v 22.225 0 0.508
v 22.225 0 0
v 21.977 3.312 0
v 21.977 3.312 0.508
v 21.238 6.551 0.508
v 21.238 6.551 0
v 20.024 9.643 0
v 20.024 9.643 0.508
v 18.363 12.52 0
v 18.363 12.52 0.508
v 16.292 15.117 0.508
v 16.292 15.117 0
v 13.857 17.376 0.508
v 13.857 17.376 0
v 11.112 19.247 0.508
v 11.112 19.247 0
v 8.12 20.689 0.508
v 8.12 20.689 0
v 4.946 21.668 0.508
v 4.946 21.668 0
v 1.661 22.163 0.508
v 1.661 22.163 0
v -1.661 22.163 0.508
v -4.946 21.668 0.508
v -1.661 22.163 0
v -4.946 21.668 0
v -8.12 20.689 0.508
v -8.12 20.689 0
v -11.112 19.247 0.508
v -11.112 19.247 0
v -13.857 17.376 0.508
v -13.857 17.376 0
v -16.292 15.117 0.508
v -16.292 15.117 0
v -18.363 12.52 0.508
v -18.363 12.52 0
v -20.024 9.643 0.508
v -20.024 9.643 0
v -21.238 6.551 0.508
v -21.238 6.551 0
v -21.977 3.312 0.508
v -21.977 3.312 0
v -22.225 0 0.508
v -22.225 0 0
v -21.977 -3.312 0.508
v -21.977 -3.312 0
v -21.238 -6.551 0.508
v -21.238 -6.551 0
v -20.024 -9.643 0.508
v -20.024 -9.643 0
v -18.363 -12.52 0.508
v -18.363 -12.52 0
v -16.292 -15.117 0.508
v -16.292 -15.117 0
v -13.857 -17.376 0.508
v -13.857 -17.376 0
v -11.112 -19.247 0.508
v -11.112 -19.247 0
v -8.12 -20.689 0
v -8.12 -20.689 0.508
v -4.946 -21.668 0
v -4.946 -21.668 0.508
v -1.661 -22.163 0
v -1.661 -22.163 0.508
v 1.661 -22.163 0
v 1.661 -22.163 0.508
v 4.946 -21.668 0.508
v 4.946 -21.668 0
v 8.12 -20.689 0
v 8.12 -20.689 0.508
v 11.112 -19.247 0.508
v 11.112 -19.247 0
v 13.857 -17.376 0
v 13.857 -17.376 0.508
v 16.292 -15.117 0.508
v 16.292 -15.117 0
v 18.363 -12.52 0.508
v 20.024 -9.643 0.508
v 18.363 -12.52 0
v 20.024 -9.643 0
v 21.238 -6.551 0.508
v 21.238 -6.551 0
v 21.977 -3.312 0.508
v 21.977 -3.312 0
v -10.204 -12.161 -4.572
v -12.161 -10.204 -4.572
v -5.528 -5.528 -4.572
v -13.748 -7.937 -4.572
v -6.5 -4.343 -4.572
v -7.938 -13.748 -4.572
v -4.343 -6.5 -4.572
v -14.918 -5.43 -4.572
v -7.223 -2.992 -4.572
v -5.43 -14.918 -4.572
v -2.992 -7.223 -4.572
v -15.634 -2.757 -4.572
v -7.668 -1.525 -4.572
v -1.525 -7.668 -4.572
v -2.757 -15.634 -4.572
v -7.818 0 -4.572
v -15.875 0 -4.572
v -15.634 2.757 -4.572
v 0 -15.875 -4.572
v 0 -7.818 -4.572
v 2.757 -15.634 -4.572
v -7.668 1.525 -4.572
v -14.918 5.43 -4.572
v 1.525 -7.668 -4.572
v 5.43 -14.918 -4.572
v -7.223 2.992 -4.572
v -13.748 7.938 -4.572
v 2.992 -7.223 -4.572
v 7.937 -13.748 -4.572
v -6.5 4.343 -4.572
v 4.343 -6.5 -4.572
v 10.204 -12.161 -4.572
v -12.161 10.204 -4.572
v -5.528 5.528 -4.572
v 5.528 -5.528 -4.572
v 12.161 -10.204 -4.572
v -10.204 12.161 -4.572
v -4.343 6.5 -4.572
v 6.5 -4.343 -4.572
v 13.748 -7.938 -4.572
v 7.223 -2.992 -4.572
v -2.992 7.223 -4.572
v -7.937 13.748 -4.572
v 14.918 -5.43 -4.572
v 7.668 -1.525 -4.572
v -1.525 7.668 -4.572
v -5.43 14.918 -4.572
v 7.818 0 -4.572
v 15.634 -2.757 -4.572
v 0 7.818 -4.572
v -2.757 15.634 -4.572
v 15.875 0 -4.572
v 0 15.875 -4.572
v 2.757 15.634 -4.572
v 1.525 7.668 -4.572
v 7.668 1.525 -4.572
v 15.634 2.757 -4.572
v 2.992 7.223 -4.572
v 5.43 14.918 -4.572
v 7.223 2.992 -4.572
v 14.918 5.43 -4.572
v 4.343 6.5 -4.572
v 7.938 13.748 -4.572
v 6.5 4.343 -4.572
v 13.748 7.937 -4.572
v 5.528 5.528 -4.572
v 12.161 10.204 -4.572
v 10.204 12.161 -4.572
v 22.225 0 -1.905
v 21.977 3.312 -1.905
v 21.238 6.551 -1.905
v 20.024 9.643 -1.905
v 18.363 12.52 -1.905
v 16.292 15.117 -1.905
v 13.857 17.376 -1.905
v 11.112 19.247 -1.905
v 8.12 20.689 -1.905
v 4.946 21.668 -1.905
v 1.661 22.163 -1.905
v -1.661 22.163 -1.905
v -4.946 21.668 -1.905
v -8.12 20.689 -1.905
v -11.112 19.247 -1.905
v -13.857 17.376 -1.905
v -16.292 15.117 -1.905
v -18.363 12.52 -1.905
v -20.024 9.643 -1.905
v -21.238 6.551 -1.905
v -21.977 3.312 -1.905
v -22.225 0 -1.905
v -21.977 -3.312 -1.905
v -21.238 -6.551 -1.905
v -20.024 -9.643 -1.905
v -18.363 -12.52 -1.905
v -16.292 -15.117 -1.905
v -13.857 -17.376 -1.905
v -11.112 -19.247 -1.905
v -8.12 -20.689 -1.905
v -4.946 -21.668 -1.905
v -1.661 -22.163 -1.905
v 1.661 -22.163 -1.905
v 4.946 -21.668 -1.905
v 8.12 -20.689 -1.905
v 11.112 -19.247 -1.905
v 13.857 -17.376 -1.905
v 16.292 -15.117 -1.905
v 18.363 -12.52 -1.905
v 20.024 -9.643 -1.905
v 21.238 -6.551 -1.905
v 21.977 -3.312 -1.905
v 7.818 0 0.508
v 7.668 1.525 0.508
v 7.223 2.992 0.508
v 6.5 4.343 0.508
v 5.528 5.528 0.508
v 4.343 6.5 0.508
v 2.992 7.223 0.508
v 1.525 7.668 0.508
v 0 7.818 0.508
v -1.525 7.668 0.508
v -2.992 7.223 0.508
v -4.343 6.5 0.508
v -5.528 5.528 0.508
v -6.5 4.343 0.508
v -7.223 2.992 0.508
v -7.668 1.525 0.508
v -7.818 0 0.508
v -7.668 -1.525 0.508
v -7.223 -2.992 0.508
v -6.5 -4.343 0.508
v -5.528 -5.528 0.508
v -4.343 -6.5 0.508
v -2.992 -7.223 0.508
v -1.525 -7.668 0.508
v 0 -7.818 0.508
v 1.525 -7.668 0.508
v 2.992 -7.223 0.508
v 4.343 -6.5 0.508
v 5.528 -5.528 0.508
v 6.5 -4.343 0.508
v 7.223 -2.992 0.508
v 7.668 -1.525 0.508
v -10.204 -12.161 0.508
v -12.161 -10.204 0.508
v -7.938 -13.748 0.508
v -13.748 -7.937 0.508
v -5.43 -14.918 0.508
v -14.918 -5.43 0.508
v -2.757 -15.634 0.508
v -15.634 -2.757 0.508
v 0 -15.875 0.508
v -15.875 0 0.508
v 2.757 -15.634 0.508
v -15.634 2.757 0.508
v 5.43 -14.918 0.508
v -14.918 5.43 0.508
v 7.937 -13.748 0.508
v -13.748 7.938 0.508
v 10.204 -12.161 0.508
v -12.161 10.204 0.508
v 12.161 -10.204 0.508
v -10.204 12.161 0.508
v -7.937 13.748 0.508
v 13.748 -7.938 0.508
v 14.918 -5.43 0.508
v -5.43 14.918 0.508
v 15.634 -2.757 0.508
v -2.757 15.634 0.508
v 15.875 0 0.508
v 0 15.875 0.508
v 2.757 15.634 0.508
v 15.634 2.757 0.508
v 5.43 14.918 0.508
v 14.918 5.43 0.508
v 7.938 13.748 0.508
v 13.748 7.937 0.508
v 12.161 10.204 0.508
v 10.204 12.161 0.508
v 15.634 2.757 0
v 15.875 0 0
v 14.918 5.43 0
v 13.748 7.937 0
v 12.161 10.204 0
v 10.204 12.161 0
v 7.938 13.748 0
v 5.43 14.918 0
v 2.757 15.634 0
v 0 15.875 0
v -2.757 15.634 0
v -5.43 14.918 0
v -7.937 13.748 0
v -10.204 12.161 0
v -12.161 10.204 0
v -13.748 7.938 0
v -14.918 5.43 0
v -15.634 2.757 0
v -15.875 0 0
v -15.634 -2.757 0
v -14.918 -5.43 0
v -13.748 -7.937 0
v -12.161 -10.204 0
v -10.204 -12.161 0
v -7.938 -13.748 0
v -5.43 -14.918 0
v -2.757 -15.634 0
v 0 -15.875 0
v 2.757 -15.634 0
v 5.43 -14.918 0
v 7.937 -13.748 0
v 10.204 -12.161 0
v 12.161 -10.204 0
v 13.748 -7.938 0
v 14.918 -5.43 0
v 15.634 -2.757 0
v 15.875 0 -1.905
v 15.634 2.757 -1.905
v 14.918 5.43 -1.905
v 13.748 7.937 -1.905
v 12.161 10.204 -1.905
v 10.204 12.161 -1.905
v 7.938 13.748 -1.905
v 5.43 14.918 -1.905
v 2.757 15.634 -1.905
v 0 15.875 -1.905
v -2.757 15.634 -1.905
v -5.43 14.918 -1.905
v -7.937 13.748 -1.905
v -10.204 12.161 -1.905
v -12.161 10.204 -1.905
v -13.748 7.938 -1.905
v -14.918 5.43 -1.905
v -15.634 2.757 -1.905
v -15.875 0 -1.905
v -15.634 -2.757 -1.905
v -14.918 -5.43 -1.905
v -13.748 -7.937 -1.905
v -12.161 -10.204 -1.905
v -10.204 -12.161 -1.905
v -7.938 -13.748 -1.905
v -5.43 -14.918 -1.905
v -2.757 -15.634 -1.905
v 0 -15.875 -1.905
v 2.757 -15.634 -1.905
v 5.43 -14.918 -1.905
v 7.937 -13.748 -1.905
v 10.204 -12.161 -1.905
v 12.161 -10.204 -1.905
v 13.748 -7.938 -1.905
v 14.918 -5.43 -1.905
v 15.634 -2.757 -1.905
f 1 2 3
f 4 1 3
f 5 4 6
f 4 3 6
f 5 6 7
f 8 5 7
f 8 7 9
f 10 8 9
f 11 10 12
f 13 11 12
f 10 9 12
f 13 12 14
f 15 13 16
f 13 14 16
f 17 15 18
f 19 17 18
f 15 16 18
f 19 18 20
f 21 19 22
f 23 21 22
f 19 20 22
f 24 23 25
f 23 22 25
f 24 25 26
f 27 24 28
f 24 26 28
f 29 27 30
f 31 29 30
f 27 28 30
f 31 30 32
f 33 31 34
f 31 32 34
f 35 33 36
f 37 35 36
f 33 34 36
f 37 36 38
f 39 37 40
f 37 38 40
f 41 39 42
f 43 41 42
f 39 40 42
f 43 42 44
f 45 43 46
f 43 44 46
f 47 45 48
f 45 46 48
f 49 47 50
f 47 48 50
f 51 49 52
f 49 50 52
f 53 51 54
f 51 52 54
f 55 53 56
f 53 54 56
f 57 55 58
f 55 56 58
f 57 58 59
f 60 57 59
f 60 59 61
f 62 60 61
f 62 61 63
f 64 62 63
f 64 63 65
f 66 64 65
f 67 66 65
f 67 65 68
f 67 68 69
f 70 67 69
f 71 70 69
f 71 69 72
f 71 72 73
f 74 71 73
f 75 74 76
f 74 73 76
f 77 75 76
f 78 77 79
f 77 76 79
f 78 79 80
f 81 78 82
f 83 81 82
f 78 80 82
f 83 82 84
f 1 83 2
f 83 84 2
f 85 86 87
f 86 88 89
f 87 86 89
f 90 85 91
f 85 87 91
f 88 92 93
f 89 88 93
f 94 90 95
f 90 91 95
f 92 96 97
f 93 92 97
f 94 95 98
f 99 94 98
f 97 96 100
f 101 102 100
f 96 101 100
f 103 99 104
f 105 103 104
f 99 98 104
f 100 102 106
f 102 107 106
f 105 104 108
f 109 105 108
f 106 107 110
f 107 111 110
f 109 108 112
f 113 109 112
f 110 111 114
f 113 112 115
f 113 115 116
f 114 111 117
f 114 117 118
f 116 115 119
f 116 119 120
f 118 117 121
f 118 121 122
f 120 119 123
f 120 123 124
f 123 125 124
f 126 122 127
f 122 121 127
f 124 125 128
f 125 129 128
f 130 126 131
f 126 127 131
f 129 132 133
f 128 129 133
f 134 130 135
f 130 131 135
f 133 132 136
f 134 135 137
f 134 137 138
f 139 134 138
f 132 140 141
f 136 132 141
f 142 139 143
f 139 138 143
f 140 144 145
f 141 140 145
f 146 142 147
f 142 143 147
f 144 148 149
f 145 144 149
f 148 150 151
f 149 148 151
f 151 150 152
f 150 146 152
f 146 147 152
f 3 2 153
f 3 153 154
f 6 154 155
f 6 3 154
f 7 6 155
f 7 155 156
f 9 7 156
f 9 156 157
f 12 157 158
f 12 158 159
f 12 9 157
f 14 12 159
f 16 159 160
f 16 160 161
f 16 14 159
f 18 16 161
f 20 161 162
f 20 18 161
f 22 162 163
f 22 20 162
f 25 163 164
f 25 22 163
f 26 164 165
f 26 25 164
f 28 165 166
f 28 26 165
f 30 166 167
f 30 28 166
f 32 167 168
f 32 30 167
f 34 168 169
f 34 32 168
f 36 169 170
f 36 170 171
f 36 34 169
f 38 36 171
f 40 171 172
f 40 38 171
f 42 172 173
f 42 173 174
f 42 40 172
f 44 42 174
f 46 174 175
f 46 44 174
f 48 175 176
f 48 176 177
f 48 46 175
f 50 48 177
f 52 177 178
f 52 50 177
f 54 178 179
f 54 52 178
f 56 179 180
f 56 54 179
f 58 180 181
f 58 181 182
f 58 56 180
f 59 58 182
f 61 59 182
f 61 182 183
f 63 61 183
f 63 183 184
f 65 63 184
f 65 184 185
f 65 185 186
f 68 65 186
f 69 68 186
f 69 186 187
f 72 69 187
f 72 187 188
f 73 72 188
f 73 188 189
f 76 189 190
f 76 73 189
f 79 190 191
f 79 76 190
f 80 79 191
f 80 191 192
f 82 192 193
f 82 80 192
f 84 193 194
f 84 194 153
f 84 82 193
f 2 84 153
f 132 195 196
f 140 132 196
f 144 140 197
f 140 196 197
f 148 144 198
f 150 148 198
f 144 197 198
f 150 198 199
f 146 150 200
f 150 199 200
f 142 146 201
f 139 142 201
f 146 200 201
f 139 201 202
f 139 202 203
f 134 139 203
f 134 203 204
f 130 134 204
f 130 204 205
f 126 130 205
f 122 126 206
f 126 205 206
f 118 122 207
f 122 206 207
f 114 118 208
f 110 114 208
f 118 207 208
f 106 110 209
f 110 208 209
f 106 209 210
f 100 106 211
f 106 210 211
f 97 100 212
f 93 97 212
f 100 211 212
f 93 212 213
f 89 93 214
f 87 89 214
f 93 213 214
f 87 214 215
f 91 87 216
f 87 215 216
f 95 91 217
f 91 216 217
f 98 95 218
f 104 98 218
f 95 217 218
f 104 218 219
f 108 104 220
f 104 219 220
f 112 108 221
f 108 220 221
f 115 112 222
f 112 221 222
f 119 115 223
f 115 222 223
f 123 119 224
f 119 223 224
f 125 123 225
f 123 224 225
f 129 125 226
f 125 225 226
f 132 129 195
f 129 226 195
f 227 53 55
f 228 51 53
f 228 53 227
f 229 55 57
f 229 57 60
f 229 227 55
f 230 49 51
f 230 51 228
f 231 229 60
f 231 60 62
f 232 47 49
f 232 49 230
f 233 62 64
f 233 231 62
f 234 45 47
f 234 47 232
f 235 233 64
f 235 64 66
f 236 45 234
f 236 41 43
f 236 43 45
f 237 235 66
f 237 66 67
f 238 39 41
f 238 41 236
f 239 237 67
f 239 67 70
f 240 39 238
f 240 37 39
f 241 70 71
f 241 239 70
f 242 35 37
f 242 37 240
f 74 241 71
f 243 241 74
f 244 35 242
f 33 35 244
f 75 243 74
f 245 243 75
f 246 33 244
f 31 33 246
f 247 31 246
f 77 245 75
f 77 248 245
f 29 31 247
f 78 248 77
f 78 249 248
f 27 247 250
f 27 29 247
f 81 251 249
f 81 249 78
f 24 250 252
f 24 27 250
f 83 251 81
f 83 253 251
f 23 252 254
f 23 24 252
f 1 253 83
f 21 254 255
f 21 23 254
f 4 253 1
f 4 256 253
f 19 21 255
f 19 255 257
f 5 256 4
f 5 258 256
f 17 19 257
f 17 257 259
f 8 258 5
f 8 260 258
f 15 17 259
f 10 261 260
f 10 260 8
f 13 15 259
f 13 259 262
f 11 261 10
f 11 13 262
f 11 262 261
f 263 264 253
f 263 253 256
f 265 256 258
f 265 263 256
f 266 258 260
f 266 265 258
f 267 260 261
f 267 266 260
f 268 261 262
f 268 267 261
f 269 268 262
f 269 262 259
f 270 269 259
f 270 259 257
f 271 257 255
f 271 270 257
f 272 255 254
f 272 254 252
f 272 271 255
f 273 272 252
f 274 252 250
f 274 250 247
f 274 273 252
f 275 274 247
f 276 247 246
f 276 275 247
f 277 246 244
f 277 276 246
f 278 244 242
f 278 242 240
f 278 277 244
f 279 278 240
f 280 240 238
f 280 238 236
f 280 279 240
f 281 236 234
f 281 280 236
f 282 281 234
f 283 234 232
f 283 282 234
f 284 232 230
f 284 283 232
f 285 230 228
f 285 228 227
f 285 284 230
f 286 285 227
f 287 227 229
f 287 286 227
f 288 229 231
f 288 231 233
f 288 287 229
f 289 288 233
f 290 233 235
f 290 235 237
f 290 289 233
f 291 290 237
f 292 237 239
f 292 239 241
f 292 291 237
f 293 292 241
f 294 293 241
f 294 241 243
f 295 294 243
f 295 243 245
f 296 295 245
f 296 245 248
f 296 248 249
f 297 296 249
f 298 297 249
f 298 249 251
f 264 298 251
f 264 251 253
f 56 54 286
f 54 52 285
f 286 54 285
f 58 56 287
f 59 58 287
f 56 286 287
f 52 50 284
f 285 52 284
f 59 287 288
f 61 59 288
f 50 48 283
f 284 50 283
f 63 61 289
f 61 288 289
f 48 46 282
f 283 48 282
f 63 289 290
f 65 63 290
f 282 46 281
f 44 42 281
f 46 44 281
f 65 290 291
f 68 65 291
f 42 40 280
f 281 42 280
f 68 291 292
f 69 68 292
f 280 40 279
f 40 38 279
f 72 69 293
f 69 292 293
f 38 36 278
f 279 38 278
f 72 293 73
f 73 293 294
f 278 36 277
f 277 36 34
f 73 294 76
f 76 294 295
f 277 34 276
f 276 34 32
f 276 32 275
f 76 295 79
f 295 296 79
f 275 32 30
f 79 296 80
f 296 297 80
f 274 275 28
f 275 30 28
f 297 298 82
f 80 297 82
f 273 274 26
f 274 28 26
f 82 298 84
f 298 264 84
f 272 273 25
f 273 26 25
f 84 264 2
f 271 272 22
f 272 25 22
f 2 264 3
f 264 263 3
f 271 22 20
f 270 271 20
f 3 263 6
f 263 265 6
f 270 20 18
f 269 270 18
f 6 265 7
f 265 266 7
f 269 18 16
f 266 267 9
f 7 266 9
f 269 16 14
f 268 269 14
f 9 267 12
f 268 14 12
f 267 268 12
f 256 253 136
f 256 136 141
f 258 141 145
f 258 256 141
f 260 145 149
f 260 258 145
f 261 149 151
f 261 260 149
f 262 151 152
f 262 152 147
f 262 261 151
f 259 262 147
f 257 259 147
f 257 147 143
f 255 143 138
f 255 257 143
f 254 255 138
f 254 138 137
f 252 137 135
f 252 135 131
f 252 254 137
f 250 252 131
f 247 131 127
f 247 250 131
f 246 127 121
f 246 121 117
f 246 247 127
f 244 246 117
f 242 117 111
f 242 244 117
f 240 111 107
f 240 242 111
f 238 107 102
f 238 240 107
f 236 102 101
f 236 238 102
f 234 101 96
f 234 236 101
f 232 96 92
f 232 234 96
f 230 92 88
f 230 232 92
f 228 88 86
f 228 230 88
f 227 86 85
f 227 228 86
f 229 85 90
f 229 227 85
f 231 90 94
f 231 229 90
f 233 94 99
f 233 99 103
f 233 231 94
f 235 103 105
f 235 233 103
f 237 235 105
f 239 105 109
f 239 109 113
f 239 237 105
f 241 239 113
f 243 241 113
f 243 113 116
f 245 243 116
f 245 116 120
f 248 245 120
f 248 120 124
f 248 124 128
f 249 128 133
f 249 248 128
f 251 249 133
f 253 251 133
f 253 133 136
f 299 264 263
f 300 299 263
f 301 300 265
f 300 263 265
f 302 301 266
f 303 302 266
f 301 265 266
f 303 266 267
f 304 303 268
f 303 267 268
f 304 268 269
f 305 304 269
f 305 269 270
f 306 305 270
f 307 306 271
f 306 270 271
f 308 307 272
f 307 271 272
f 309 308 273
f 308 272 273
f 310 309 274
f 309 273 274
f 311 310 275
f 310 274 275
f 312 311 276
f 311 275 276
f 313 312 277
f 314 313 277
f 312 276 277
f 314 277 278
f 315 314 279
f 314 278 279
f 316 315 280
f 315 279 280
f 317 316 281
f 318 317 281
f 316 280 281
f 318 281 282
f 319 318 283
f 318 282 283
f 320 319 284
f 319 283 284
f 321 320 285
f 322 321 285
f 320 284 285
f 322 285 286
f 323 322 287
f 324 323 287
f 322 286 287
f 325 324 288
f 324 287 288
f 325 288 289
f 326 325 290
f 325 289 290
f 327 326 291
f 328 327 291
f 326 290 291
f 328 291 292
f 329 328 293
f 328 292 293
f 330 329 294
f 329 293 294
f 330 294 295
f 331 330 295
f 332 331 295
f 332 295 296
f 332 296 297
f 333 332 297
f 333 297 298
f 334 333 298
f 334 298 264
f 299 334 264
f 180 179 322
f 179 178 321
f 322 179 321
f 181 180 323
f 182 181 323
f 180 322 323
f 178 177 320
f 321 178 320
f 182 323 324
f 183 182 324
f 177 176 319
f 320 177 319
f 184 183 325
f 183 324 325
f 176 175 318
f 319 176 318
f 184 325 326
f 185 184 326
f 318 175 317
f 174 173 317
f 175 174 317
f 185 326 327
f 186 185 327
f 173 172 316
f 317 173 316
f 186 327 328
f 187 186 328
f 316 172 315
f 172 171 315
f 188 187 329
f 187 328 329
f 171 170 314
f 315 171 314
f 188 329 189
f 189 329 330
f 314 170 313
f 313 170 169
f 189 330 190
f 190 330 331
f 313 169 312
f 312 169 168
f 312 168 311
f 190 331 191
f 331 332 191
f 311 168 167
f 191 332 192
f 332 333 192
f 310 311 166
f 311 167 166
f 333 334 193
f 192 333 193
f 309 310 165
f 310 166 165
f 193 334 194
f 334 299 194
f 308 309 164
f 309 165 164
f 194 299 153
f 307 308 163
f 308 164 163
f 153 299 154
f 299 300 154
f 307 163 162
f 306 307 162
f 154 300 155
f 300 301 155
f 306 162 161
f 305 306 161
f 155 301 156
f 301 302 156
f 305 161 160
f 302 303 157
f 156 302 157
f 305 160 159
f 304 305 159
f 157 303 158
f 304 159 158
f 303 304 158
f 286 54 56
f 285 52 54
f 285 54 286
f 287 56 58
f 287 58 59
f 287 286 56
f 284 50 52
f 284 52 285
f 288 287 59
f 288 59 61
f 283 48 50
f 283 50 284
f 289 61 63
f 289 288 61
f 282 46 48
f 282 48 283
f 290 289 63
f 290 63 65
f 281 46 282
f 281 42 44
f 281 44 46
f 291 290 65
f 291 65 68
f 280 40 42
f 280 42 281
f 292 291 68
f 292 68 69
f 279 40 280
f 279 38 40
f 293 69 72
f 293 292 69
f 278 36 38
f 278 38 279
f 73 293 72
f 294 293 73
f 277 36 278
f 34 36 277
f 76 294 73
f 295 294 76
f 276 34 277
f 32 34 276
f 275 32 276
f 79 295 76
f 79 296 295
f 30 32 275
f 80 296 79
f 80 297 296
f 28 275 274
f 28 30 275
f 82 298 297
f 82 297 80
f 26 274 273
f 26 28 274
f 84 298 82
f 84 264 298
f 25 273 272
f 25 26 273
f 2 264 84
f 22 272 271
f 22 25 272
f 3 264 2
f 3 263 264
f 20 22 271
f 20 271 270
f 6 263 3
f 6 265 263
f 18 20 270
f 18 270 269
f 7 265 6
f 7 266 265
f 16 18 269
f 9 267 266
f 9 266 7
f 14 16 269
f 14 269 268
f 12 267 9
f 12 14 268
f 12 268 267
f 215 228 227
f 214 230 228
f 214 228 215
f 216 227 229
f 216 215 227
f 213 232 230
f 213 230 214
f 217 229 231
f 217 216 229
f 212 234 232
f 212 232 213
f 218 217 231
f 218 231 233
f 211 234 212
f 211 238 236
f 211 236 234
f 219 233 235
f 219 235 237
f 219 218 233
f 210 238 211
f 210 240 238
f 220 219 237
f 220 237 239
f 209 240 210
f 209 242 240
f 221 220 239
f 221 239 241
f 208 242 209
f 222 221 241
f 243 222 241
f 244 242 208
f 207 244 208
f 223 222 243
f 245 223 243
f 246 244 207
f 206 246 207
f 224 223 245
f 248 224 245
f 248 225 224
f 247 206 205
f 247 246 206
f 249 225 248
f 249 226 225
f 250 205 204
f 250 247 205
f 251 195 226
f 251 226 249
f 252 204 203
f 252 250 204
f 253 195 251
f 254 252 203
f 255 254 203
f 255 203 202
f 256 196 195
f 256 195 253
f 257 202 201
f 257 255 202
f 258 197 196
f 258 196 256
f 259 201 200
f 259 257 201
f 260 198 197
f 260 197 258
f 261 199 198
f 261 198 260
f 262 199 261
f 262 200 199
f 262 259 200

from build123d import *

# Parameters (mm, degrees)
F0_R        = 22.225
F0_R_2      = 15.875
F1_DEPTH    = 1.905
F1_FACE_R   = 22.225
F1_FACE_R_2 = 15.875
F2_DEPTH    = 0.508
F3_R        = 15.875
F3_R_2      = 7.818053
F4_DEPTH    = 5.08


with BuildPart() as f1:
    # F0 (on Top) → F1 (new body)
    with BuildSketch(Plane.XY):
        Circle(F0_R)
        Circle(F0_R_2, mode=Mode.SUBTRACT)
    extrude(amount=-F1_DEPTH)


with BuildPart() as f2:
    # F1_face (on face) → F2 (new body)
    with BuildSketch(Plane.XY):
        Circle(F1_FACE_R)
        Circle(F1_FACE_R_2, mode=Mode.SUBTRACT)
    extrude(amount=F2_DEPTH)


with BuildPart() as f4:
    # F3 (on face) → F4 (new body)
    with BuildSketch(Plane.XY.offset(0.508)):
        Circle(F3_R)
        Circle(F3_R_2, mode=Mode.SUBTRACT)
    extrude(amount=-F4_DEPTH)


solid = Compound([f1.part, f2.part, f4.part])
